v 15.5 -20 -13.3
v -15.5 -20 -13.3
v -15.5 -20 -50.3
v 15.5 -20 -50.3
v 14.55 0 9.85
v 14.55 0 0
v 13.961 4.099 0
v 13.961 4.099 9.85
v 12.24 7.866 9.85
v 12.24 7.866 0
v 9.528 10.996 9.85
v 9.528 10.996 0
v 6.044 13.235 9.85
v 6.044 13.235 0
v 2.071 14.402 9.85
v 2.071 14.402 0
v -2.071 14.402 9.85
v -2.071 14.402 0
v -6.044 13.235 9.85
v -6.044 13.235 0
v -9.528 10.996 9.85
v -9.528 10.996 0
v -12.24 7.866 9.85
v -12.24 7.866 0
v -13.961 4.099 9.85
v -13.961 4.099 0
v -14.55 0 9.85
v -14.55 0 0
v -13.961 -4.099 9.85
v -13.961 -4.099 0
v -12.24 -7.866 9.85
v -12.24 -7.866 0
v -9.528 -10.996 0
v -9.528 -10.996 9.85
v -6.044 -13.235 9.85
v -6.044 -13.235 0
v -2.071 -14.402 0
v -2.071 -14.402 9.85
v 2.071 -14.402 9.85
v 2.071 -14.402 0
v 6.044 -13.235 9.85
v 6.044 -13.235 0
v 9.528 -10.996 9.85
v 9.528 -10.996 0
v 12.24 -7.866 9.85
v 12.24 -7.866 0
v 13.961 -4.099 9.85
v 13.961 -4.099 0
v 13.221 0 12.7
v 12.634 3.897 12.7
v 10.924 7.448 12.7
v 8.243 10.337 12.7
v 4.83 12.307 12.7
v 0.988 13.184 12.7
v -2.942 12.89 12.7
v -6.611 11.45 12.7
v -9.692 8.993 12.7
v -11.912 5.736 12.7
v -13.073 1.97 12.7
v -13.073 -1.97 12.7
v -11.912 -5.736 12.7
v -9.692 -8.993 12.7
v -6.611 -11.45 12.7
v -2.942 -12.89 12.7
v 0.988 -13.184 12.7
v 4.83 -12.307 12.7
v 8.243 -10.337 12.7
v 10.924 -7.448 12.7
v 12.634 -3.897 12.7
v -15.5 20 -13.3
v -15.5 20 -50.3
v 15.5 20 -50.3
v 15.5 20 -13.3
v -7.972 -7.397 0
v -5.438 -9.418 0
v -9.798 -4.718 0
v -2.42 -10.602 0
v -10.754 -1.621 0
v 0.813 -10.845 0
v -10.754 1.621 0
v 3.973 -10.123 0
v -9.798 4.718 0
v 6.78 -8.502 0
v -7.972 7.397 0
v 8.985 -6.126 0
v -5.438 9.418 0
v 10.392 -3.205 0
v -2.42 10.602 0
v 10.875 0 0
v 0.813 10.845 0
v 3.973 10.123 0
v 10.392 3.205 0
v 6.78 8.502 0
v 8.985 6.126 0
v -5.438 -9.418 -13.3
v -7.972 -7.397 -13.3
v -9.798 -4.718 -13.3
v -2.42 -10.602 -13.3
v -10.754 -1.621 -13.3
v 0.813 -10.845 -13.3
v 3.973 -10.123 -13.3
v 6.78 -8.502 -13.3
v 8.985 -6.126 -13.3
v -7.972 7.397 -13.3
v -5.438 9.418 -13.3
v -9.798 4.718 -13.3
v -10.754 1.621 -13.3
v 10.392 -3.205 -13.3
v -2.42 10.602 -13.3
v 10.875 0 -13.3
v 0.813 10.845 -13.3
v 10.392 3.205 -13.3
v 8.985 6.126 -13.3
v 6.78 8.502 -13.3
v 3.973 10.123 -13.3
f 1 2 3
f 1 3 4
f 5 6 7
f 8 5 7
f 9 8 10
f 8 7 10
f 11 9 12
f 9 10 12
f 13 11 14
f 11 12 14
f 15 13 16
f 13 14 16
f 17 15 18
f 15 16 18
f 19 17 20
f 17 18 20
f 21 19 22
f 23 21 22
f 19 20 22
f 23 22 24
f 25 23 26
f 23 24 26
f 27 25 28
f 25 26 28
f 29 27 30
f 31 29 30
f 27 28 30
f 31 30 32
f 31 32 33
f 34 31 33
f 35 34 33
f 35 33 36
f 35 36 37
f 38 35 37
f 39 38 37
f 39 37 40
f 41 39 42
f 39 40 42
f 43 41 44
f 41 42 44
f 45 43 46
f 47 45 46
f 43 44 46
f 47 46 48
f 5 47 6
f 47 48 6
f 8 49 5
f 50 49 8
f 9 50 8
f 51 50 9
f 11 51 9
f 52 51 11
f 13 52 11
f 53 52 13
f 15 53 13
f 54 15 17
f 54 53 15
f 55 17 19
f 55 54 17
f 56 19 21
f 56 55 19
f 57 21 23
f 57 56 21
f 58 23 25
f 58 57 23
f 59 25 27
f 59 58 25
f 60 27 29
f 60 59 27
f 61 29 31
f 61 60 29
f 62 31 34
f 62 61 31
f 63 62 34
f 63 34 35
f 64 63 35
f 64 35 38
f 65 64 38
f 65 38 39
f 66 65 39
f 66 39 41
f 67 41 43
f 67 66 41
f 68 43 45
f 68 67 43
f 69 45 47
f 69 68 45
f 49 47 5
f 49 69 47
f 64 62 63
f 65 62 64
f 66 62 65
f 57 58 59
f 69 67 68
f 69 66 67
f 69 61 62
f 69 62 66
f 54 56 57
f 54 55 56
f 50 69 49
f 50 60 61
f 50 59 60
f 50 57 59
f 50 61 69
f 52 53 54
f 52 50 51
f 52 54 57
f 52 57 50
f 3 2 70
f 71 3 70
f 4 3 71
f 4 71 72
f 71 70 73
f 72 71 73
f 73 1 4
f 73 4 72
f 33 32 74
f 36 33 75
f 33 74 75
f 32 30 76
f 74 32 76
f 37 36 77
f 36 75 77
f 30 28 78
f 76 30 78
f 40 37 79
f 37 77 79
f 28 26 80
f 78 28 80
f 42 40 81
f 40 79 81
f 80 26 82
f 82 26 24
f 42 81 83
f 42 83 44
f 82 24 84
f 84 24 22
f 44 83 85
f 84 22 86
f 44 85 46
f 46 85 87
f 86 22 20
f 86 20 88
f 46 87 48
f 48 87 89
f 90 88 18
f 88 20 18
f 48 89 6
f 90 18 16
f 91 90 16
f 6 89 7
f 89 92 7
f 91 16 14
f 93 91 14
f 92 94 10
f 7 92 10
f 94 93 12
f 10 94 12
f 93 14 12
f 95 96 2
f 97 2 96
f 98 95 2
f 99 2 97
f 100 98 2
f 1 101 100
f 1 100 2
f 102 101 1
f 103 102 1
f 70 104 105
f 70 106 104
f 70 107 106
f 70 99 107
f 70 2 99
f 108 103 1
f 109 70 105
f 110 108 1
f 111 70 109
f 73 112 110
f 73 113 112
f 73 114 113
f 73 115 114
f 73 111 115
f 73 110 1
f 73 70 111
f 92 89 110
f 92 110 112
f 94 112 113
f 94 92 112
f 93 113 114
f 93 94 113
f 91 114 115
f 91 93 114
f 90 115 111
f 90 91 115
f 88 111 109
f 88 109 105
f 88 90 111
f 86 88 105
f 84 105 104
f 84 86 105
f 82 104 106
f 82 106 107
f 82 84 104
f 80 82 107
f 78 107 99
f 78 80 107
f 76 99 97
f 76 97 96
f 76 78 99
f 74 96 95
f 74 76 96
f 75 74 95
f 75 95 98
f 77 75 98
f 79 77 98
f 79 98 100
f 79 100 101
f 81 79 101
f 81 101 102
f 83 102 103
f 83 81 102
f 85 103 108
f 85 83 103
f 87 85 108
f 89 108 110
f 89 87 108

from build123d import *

# Parameters (mm, degrees)
SKETCH1_R           = 14.55
BOSS_EXTRUDE1_DEPTH = 9.85
SKETCH3_R           = 14.55
BOSS_EXTRUDE3_DEPTH = 2.85
BOSS_EXTRUDE3_TAPER = 25
SKETCH4_R           = 10.875
BOSS_EXTRUDE4_DEPTH = 13.3
SKETCH2_W           = 31
SKETCH2_H           = 40
BOSS_EXTRUDE2_DEPTH = 37


with BuildPart() as part:
    # Sketch1 → Boss-Extrude1 (new body)
    with BuildSketch(Plane.XY):
        Circle(SKETCH1_R)
    extrude(amount=BOSS_EXTRUDE1_DEPTH)

    # Sketch3 → Boss-Extrude3 (add)
    with BuildSketch(Plane.XY.offset(9.85)):
        Circle(SKETCH3_R)
    extrude(amount=BOSS_EXTRUDE3_DEPTH, taper=BOSS_EXTRUDE3_TAPER)

    # Sketch4 → Boss-Extrude4 (add)
    with BuildSketch(Plane.XY):
        Circle(SKETCH4_R)
    extrude(amount=-BOSS_EXTRUDE4_DEPTH)

    # Sketch2 → Boss-Extrude2 (add)
    with BuildSketch(Plane.XY.offset(-13.3)):
        Rectangle(SKETCH2_W, SKETCH2_H)
    extrude(amount=-BOSS_EXTRUDE2_DEPTH)


solid = part.part
